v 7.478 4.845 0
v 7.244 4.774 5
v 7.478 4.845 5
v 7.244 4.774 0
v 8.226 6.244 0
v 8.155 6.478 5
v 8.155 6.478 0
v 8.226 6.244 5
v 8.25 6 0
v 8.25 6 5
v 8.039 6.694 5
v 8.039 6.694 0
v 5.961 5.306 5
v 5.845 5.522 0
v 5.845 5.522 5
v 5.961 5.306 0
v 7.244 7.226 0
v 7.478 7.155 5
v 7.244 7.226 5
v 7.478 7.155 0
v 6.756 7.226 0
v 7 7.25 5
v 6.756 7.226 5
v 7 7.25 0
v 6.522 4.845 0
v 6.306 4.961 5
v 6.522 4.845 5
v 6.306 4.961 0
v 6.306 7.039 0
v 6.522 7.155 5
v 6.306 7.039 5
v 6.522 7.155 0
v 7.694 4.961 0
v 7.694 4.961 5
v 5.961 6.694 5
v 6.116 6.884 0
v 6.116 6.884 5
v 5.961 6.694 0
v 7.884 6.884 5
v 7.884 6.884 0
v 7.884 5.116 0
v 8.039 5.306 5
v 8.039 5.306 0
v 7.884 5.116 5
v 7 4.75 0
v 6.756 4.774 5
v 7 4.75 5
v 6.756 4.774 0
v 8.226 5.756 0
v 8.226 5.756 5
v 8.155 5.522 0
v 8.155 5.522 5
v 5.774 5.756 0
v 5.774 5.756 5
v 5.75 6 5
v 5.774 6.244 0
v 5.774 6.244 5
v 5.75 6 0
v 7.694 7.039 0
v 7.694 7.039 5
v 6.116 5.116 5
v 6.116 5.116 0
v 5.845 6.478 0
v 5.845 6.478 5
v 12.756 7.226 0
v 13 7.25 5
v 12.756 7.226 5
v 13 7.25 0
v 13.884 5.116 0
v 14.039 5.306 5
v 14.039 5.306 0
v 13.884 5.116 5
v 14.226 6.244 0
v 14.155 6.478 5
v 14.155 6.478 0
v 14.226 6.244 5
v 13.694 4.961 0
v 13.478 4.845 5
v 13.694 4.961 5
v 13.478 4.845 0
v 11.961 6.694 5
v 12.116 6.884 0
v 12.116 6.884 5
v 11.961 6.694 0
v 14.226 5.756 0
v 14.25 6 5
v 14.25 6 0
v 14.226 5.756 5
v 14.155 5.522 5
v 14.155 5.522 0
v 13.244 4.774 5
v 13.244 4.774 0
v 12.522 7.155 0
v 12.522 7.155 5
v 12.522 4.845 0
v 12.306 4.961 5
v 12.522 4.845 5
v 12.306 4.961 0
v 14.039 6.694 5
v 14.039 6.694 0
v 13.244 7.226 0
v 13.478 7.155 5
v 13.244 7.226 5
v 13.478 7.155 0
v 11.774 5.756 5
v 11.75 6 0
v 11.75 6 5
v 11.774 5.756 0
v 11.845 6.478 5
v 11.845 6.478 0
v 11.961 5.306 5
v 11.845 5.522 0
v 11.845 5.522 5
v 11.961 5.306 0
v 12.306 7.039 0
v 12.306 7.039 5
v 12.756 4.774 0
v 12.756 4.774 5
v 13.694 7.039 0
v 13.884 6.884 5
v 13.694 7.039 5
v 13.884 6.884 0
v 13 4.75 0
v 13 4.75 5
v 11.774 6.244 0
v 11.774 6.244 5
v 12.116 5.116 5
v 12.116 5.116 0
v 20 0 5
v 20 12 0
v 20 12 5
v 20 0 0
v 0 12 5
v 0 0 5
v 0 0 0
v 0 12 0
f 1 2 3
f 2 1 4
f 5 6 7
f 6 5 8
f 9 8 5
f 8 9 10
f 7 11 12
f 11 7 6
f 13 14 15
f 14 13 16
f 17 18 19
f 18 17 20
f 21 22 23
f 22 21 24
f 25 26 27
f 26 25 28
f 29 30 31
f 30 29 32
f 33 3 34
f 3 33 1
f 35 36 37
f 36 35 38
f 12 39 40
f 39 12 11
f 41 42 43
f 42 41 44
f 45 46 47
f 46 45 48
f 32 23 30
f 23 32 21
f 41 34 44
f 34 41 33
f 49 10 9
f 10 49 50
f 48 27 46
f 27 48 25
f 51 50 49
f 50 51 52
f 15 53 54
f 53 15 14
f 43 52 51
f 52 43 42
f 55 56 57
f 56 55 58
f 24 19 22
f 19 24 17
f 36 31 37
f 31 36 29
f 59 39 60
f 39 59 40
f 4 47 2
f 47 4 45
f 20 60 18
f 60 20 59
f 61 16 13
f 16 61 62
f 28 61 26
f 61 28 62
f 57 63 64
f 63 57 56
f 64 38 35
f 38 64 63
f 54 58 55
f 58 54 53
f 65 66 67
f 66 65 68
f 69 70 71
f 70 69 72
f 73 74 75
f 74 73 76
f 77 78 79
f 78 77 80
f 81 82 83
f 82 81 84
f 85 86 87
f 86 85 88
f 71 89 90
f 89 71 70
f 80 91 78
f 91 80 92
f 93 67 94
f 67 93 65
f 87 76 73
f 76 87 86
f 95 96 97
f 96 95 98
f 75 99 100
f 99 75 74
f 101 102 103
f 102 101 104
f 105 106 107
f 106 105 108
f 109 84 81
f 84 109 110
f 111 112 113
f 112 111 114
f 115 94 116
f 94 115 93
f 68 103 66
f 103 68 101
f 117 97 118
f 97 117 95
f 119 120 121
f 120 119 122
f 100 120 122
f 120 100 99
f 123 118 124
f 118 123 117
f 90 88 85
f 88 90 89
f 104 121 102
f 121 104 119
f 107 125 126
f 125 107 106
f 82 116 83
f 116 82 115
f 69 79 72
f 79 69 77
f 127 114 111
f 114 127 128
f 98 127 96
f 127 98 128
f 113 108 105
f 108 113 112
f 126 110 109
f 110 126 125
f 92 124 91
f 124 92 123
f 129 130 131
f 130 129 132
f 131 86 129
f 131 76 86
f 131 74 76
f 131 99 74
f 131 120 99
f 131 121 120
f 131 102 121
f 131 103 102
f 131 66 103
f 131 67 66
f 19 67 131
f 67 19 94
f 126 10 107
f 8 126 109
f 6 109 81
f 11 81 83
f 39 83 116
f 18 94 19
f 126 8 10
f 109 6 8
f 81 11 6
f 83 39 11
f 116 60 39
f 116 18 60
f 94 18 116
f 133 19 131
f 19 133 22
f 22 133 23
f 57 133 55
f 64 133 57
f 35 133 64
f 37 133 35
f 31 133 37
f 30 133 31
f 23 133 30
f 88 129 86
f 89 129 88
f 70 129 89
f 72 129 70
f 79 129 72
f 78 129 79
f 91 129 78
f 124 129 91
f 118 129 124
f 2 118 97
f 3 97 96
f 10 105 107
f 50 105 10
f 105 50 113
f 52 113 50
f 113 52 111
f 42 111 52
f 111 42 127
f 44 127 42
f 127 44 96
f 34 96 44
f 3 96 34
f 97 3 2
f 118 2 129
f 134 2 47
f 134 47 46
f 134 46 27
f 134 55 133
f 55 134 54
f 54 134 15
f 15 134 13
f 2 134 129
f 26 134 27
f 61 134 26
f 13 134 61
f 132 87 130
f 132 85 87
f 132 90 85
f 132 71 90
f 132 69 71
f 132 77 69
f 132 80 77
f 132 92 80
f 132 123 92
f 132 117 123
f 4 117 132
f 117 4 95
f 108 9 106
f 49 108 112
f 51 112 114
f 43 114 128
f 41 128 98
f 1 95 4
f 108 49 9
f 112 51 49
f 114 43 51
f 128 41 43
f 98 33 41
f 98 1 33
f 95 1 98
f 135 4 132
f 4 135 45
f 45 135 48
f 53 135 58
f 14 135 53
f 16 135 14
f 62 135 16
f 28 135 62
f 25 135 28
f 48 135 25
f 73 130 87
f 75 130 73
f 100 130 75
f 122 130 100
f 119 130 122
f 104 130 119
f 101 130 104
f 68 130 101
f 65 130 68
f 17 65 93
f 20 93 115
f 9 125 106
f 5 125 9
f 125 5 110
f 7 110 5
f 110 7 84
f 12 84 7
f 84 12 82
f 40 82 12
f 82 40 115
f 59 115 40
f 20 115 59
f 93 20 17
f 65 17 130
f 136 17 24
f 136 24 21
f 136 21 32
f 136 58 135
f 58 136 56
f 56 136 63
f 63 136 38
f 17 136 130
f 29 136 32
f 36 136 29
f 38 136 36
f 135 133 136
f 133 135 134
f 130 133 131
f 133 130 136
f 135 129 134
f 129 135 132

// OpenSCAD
$fn = 32;

// ----------------------------------------------------------------------
// Micro pad: two-hole pad, 5-20 mm class
// ----------------------------------------------------------------------

// --- parameters (mm) ---
pad_l = 20;               // pad length, X
pad_w = 12;               // pad width, Y
pad_t = 5;                // pad thickness, Z
hole_d = 2.5;             // hole diameter
hole_x = 7;               // X of the first hole centre
fit_tol = 0.02;           // tolerance for press fits, mm
free_tol = 0.2;           // tolerance for clearance fits, mm

difference() {
  cube([pad_l, pad_w, pad_t]);
  for (x = [hole_x, pad_l - hole_x])
    translate([x, pad_w / 2, -1])
      cylinder(h = pad_t + 2, d = hole_d);
}
